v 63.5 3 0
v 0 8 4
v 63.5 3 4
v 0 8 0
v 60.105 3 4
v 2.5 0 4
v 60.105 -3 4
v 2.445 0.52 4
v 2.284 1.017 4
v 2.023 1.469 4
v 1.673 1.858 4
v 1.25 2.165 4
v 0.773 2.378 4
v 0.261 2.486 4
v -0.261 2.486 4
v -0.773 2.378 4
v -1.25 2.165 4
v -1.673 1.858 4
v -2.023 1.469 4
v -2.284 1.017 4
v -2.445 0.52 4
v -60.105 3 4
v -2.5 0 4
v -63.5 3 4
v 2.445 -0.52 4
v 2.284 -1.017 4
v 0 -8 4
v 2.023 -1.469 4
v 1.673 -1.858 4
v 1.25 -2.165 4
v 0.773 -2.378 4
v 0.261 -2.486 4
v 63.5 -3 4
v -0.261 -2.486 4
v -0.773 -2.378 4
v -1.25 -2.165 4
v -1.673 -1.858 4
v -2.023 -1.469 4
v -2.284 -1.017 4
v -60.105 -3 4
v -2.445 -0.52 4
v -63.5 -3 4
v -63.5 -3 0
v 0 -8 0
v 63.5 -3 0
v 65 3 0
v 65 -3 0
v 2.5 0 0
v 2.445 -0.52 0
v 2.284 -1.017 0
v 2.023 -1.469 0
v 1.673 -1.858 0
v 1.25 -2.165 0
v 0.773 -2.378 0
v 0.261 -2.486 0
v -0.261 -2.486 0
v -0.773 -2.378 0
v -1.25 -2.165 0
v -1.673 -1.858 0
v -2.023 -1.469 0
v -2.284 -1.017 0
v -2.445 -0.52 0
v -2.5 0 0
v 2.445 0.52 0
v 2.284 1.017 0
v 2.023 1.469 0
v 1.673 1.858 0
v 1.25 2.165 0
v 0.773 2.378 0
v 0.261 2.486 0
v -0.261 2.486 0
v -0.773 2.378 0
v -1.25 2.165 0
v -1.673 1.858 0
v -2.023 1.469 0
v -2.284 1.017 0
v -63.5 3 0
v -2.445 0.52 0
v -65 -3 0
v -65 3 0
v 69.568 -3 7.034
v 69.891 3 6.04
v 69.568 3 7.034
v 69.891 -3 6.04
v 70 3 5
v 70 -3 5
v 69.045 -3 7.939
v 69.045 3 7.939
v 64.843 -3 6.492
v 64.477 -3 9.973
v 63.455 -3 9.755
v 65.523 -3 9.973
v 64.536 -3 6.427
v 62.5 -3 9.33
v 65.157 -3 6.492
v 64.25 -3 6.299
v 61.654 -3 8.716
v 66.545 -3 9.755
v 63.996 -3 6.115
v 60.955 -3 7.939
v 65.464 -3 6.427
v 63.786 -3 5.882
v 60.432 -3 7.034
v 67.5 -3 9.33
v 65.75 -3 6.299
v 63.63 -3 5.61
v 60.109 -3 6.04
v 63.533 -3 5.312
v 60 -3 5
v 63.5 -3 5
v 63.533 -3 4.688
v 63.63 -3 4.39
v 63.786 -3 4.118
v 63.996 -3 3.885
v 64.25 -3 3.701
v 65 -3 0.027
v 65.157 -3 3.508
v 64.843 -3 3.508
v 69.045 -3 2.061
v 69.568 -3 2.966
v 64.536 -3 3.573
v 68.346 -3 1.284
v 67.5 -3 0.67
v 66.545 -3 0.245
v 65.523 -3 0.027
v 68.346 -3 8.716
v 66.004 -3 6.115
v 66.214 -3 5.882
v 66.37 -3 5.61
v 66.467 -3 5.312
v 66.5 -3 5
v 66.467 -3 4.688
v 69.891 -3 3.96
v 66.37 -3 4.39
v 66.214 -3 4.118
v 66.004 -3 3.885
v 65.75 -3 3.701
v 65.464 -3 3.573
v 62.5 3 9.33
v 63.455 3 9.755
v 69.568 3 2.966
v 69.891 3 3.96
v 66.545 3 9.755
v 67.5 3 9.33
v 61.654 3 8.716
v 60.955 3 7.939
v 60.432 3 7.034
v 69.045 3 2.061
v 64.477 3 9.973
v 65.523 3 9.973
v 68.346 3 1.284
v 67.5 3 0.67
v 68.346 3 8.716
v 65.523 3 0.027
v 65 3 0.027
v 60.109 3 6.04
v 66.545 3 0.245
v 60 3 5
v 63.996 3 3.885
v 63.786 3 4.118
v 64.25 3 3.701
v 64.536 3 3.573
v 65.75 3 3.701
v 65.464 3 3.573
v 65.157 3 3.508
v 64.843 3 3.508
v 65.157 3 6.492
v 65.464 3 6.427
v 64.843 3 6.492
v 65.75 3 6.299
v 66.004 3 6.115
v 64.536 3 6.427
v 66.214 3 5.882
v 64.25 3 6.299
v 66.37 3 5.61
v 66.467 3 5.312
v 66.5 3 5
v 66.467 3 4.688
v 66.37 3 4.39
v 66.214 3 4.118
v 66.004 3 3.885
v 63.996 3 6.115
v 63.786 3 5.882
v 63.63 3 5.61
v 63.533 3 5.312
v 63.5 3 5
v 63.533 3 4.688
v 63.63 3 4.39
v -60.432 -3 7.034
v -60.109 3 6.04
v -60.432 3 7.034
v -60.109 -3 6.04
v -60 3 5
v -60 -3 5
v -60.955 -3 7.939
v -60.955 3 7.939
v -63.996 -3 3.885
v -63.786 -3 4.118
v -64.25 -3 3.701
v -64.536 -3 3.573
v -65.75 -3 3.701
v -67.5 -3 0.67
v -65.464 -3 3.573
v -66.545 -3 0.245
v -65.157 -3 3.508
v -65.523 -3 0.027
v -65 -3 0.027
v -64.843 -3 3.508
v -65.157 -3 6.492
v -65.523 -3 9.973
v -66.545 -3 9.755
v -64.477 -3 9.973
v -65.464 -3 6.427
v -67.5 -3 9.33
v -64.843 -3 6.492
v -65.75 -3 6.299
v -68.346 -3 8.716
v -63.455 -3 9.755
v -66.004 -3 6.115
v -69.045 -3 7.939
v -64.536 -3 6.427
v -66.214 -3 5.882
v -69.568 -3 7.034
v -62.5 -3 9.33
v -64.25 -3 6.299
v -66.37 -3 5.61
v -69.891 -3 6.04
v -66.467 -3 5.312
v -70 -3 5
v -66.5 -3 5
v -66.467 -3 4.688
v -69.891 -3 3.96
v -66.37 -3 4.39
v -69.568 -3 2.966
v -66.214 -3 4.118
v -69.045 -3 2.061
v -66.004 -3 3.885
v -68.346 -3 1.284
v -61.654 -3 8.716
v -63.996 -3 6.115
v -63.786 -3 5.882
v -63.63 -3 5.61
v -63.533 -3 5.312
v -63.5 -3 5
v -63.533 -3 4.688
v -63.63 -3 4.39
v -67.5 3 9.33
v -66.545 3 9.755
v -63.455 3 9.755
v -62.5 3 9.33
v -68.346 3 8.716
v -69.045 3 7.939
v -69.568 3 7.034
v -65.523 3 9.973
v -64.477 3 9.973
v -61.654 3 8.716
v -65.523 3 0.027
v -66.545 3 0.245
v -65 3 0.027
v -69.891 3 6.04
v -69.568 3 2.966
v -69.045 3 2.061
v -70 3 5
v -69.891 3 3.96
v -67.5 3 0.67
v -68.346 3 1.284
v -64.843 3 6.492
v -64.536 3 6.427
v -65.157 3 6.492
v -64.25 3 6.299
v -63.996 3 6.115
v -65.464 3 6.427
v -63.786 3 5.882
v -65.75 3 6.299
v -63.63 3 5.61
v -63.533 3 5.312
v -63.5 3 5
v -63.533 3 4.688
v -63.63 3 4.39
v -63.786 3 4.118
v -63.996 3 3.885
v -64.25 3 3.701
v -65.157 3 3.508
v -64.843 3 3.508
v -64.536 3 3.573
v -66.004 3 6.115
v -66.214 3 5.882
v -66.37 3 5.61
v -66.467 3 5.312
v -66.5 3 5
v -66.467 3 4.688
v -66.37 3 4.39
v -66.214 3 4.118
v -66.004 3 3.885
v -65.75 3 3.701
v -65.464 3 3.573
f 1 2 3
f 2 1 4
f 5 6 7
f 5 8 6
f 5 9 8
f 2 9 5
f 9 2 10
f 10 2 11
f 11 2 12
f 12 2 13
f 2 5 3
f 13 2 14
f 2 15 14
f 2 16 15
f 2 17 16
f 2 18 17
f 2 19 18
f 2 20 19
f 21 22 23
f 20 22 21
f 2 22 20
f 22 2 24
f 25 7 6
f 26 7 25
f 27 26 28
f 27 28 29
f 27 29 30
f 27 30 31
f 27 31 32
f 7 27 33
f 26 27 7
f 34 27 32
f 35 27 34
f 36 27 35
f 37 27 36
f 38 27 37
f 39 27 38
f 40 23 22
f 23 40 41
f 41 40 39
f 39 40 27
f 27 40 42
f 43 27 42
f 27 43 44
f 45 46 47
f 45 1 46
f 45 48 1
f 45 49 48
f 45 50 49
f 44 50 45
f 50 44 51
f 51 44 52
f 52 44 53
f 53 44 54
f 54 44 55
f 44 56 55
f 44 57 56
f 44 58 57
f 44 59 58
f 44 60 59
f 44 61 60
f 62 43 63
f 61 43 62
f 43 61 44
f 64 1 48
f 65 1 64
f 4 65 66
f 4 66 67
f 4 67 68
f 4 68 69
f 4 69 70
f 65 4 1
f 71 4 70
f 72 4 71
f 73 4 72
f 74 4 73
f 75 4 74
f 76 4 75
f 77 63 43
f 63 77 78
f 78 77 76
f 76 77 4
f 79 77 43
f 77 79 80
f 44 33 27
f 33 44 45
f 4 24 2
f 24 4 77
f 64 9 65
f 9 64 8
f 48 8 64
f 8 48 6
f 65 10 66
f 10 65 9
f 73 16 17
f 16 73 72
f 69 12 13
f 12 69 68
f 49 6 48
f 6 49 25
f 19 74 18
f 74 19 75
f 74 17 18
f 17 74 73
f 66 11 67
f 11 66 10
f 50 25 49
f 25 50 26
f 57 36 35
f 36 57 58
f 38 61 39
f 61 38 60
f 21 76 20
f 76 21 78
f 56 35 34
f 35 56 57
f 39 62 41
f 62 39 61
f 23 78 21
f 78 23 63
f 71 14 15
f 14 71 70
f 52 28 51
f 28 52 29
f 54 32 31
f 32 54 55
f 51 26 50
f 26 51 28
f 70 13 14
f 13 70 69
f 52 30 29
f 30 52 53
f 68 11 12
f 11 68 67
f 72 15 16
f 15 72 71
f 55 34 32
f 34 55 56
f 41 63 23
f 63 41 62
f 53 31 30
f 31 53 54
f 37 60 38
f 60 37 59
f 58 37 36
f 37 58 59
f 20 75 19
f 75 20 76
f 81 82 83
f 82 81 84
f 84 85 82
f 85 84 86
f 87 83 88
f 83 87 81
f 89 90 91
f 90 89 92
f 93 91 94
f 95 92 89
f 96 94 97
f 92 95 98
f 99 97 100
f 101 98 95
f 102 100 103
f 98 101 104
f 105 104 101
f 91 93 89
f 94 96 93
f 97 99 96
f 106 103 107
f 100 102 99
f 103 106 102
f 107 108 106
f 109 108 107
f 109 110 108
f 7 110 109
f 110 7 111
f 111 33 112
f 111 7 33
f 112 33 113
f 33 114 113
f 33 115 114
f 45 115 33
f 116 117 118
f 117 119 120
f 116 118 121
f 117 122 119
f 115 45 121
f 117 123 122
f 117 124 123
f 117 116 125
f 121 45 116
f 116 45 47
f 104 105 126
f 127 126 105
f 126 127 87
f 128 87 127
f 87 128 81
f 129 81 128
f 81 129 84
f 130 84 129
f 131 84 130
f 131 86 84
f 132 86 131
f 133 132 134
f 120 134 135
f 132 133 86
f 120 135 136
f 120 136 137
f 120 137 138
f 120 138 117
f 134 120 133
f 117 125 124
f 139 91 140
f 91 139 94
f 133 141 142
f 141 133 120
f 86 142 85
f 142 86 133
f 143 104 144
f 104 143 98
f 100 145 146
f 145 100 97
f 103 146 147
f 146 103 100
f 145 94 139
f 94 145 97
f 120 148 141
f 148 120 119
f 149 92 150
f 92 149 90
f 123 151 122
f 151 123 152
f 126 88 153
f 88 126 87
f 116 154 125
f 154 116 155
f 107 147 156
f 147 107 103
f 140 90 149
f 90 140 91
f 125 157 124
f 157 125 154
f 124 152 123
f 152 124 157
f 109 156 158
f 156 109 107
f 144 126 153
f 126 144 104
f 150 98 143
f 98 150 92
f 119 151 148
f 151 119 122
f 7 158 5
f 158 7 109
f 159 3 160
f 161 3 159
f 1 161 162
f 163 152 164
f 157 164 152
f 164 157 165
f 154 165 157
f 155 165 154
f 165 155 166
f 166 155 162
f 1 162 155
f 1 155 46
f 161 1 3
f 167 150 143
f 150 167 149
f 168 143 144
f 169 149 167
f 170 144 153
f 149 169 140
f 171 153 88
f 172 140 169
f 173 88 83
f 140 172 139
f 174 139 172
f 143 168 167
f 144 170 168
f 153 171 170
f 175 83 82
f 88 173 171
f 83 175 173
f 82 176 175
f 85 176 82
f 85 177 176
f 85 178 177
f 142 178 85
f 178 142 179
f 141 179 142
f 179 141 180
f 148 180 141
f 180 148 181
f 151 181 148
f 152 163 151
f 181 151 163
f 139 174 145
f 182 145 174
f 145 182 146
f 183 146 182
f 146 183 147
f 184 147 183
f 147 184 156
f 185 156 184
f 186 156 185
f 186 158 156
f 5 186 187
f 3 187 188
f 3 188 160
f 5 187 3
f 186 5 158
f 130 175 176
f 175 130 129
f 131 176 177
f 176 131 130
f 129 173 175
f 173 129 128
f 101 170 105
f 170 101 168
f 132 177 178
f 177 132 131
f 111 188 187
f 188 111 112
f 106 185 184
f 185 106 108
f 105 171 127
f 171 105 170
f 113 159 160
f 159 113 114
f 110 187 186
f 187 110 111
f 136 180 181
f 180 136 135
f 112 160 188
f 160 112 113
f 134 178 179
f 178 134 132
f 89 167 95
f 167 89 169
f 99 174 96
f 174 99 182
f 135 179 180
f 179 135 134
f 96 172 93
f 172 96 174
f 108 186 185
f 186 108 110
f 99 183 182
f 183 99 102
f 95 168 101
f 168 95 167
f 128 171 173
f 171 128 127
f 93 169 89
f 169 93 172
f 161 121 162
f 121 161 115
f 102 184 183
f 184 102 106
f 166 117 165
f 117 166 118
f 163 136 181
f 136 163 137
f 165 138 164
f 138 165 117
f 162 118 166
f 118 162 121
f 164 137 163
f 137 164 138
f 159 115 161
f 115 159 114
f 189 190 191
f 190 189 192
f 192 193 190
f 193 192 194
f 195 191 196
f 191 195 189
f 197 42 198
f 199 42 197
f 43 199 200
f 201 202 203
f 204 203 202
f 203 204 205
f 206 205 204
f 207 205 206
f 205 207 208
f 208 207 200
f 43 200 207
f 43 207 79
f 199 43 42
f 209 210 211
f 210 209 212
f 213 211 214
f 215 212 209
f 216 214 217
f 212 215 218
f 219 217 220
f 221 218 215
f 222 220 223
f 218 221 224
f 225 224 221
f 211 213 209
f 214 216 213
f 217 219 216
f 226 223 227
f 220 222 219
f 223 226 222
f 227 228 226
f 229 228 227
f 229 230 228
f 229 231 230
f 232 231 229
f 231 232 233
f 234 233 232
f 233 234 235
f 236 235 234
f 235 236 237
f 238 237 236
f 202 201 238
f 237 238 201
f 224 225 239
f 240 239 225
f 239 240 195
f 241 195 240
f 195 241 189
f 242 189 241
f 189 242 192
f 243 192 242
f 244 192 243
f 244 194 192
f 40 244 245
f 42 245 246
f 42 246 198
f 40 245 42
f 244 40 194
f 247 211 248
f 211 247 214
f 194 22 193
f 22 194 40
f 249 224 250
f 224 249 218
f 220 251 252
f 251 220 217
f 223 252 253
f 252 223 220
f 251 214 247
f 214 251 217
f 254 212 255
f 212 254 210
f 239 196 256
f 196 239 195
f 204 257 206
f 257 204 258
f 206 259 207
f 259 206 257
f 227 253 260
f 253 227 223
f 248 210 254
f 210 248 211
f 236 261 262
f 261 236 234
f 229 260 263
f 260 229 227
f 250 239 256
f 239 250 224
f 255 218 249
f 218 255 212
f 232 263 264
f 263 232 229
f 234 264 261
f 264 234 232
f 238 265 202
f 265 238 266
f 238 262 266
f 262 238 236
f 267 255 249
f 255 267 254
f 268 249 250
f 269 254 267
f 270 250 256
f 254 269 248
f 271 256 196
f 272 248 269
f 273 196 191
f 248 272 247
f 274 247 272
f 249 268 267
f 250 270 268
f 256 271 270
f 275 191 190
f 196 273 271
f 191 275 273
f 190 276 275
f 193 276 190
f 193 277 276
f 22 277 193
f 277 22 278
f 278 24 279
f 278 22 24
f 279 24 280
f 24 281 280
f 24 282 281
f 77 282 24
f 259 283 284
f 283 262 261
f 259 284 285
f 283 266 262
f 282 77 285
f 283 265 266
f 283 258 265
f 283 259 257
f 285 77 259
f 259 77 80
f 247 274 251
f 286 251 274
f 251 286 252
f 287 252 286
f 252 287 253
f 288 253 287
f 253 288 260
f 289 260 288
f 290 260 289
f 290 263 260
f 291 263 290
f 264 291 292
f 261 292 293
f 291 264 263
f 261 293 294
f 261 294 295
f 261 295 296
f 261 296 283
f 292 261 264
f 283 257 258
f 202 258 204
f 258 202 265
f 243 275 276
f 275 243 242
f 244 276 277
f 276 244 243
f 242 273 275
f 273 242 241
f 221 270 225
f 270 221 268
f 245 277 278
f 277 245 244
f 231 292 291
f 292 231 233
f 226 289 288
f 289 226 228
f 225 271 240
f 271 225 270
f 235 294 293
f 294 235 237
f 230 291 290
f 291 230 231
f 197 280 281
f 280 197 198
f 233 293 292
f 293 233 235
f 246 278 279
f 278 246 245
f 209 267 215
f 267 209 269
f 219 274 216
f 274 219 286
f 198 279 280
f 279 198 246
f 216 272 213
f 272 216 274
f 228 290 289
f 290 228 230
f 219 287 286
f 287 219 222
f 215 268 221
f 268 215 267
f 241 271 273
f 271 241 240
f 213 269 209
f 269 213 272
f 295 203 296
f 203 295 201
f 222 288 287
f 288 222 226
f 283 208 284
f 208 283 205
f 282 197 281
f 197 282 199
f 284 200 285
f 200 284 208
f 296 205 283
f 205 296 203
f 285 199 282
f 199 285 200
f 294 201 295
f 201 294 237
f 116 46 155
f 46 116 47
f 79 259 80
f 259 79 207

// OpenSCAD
$fn=30;

difference(){

linear_extrude(height=4)
polygon(
[[-63.5,3],
[0,8],
[63.5,3],
[63.5,-3],
[0,-8],
[-63.5,-3]]);

cylinder(d=5,h=10,center=true);
}

translate([65,0,5])rotate([90,0,0])
difference(){
cylinder(d=10,h=6,center=true);
cylinder(d=3,h=7,center=true);
}

translate([-65,0,5])rotate([90,0,0])
difference(){
cylinder(d=10,h=6,center=true);
cylinder(d=3,h=7,center=true);
}

translate([60,-3,0])
cube([5,6,1.5]);

translate([-65,-3,0])
cube([5,6,1.5]);
